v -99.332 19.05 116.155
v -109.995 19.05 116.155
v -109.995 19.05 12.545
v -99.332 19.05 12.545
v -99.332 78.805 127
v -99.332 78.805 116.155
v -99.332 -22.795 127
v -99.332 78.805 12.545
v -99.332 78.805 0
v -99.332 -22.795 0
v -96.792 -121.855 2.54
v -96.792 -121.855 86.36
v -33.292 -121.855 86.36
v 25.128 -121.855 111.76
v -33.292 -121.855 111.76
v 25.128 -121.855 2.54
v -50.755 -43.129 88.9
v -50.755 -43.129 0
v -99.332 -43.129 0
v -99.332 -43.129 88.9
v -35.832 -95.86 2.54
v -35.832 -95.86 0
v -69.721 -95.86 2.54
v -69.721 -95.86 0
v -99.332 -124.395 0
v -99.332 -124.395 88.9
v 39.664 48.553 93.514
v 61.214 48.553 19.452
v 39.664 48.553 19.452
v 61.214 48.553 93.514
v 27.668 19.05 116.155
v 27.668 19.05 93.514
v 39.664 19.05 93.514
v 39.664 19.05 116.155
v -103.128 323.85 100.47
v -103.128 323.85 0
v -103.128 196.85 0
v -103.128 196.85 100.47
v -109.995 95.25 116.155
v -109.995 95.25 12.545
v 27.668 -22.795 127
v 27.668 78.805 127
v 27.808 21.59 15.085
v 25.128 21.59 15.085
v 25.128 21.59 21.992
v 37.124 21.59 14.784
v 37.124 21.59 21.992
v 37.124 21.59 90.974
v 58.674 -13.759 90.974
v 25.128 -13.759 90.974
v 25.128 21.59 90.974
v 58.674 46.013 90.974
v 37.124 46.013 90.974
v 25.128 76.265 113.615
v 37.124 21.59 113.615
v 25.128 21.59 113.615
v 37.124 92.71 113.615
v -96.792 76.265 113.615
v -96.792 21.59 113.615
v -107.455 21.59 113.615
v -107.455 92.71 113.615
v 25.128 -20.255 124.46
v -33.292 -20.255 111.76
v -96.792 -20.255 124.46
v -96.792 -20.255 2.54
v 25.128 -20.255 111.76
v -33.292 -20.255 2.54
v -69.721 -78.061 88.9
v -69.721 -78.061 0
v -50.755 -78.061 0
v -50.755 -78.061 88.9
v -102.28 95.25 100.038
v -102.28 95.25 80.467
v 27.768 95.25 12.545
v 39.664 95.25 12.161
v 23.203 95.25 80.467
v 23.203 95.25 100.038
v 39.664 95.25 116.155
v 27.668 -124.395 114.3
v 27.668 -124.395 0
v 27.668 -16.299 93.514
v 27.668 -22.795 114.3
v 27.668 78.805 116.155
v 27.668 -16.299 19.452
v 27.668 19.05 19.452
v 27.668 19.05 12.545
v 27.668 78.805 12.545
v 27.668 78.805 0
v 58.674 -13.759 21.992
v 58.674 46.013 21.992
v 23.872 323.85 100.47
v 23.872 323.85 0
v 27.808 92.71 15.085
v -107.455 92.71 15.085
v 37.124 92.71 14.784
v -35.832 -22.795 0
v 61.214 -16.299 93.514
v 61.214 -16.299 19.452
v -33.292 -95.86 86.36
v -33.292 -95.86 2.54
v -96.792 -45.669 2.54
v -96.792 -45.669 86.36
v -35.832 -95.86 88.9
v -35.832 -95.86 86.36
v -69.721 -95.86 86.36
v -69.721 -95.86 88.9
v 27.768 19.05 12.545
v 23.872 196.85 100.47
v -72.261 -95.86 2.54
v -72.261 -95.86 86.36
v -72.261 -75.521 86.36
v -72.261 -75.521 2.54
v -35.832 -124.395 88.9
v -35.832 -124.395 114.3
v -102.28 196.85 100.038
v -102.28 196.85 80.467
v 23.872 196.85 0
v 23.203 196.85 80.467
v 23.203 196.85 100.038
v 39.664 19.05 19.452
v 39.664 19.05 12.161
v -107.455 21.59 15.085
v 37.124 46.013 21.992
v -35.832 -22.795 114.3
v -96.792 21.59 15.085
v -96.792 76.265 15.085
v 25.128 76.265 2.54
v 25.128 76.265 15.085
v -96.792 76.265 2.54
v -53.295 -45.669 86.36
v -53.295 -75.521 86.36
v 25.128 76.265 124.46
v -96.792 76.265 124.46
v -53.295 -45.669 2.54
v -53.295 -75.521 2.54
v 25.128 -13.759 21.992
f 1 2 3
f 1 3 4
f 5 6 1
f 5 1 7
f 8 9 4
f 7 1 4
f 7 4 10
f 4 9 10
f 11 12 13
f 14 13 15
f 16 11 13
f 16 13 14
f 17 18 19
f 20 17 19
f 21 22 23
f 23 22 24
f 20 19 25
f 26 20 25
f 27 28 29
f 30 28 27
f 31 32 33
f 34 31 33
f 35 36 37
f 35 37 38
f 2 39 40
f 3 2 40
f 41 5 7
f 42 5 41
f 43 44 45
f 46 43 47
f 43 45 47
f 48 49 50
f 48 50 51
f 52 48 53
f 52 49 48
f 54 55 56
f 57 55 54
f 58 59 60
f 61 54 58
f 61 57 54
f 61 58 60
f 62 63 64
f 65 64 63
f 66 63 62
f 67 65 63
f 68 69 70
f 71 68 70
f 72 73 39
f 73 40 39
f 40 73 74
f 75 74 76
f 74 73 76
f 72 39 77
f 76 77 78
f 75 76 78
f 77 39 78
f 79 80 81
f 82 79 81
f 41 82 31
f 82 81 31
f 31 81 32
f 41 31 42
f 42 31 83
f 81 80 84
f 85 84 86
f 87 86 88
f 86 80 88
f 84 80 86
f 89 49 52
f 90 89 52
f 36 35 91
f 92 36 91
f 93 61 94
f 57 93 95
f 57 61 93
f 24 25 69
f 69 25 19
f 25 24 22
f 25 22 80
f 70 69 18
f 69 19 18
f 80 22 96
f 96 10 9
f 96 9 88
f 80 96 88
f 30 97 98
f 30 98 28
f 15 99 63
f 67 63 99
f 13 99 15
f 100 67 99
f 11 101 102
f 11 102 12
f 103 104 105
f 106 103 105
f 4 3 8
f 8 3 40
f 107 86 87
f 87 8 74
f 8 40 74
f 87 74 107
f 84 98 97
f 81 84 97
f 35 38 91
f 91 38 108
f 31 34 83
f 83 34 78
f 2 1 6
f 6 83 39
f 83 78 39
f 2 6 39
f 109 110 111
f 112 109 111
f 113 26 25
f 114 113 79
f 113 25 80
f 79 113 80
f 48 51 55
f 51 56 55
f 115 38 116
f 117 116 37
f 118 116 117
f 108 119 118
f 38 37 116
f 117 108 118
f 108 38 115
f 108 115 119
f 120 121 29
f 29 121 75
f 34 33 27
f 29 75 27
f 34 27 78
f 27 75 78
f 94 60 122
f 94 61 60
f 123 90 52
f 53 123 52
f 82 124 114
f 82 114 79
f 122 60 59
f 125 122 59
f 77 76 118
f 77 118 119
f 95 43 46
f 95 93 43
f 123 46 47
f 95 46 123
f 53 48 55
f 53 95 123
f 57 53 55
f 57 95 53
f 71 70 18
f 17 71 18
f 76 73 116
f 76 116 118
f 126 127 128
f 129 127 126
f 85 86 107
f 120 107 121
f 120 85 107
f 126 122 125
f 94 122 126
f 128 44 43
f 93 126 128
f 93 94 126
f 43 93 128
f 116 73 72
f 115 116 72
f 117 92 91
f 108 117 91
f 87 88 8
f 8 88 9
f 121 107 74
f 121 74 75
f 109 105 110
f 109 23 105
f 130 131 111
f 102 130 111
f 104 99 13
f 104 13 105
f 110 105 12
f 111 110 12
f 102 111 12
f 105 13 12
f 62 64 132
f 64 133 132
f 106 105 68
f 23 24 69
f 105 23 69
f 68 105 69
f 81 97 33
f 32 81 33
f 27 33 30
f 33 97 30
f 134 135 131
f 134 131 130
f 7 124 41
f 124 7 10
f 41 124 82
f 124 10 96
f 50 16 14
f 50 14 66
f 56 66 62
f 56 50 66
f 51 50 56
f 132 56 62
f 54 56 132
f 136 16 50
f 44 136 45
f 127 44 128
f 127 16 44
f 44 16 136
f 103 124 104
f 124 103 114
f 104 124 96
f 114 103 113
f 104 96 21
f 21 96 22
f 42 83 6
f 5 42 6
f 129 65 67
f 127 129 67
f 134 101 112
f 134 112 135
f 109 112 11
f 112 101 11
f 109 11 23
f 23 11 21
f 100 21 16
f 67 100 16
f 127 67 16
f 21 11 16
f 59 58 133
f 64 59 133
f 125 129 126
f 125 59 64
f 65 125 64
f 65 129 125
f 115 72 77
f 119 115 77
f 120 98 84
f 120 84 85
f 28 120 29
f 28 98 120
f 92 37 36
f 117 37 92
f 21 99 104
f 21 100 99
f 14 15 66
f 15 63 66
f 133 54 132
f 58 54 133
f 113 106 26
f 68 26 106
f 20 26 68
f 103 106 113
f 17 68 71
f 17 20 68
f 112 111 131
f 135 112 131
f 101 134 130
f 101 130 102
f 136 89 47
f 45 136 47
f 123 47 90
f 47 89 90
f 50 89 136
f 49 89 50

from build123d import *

# Parameters (mm, degrees)
F1_DEPTH  = 127
F2_DEPTH  = 114.3
F3_DEPTH  = 88.9
F6_DEPTH  = 76.2
F8_W      = 64.8522339761
F8_H      = 74.062012136
F9_DEPTH  = 38.1
F10_T     = -2.54
F11_W     = 125.4833117127
F11_H     = 19.5707902312
F12_DEPTH = 101.6
F14_W     = 127
F14_H     = 100.4699997724
F15_DEPTH = 127


# Not quite as in the source:
# - a shell that OpenCascade refuses in one call is made with other operations: the cavity is built on its own and cut out


with BuildPart() as f1:
    # F0 (on Top) → F1 (new body)
    with BuildSketch(Plane.XY):
        Polygon((27.6681821086, 78.8052295411), (-99.3318178914, 78.8052295411), (-99.3318178914, -22.7947704589), (-35.8318178914, -22.7947704589), (27.6681821086, -22.7947704589), align=None)
    extrude(amount=F1_DEPTH)

    # F0 (on Top) → F2 (join)
    with BuildSketch(Plane.XY):
        Polygon((27.6681821086, -124.3947704589), (27.6681821086, -22.7947704589), (-35.8318178914, -22.7947704589), (-35.8318178914, -95.8602428436), (-35.8318178914, -124.3947704589), align=None)
    extrude(amount=F2_DEPTH)

    # F0 (on Top) → F3 (join)
    with BuildSketch(Plane.XY):
        Polygon((-35.8318178914, -124.3947704589), (-35.8318178914, -95.8602428436), (-69.7213560343, -95.8602428436), (-69.7213560343, -85.9395861626), (-69.7213560343, -78.0614241958), (-50.7554039359, -78.0614241958), (-50.7554039359, -43.129093945), (-99.3318178914, -43.129093945), (-99.3318178914, -124.3947704589), align=None)
    extrude(amount=F3_DEPTH)

    # F5 (on offset) → F6 (join)
    with BuildSketch(Plane.XZ.offset(-95.25)):
        Polygon((-109.9954843521, 12.5446757302), (27.7675427496, 12.5446757302), (39.663515985, 12.1609345078), (39.663515985, 116.1547526717), (-109.9954843521, 116.1547526717), align=None)
    extrude(amount=F6_DEPTH)

    # F8 (on offset) → F9 (join)
    with BuildSketch(Plane.YZ.offset(61.214)):
        with Locations((16.1268953234, 56.4830191433)):
            Rectangle(F8_W, F8_H)
    extrude(amount=-F9_DEPTH)

    # F10: a shell. OpenCascade refuses it in one call, so the cavity is built on its own and cut out:
    # the body offset inwards by the wall thickness, plus a prism from it out through each open face.
    f10_core = offset(f1.part, amount=F10_T, kind=Kind.INTERSECTION, mode=Mode.PRIVATE)
    f10_exits = [f10_core.faces().sort_by_distance(p)[0] for p in [
        (-52.776587, -98.400243, 44.45),
    ]]
    add(f10_core, mode=Mode.SUBTRACT)
    extrude(f10_exits, amount=-F10_T, mode=Mode.SUBTRACT)

    # F11 (on offset) → F12 (join)
    with BuildSketch(Plane.XZ.offset(-95.25)):
        with Locations((-39.538461715, 90.2522318065)):
            Rectangle(F11_W, F11_H)
    extrude(amount=-F12_DEPTH)

    # F14 (on offset) → F15 (join)
    with BuildSketch(Plane.XZ.offset(-196.85)):
        with Locations((-39.6279752942, 50.2349998862)):
            Rectangle(F14_W, F14_H)
    extrude(amount=-F15_DEPTH)


solid = f1.part
